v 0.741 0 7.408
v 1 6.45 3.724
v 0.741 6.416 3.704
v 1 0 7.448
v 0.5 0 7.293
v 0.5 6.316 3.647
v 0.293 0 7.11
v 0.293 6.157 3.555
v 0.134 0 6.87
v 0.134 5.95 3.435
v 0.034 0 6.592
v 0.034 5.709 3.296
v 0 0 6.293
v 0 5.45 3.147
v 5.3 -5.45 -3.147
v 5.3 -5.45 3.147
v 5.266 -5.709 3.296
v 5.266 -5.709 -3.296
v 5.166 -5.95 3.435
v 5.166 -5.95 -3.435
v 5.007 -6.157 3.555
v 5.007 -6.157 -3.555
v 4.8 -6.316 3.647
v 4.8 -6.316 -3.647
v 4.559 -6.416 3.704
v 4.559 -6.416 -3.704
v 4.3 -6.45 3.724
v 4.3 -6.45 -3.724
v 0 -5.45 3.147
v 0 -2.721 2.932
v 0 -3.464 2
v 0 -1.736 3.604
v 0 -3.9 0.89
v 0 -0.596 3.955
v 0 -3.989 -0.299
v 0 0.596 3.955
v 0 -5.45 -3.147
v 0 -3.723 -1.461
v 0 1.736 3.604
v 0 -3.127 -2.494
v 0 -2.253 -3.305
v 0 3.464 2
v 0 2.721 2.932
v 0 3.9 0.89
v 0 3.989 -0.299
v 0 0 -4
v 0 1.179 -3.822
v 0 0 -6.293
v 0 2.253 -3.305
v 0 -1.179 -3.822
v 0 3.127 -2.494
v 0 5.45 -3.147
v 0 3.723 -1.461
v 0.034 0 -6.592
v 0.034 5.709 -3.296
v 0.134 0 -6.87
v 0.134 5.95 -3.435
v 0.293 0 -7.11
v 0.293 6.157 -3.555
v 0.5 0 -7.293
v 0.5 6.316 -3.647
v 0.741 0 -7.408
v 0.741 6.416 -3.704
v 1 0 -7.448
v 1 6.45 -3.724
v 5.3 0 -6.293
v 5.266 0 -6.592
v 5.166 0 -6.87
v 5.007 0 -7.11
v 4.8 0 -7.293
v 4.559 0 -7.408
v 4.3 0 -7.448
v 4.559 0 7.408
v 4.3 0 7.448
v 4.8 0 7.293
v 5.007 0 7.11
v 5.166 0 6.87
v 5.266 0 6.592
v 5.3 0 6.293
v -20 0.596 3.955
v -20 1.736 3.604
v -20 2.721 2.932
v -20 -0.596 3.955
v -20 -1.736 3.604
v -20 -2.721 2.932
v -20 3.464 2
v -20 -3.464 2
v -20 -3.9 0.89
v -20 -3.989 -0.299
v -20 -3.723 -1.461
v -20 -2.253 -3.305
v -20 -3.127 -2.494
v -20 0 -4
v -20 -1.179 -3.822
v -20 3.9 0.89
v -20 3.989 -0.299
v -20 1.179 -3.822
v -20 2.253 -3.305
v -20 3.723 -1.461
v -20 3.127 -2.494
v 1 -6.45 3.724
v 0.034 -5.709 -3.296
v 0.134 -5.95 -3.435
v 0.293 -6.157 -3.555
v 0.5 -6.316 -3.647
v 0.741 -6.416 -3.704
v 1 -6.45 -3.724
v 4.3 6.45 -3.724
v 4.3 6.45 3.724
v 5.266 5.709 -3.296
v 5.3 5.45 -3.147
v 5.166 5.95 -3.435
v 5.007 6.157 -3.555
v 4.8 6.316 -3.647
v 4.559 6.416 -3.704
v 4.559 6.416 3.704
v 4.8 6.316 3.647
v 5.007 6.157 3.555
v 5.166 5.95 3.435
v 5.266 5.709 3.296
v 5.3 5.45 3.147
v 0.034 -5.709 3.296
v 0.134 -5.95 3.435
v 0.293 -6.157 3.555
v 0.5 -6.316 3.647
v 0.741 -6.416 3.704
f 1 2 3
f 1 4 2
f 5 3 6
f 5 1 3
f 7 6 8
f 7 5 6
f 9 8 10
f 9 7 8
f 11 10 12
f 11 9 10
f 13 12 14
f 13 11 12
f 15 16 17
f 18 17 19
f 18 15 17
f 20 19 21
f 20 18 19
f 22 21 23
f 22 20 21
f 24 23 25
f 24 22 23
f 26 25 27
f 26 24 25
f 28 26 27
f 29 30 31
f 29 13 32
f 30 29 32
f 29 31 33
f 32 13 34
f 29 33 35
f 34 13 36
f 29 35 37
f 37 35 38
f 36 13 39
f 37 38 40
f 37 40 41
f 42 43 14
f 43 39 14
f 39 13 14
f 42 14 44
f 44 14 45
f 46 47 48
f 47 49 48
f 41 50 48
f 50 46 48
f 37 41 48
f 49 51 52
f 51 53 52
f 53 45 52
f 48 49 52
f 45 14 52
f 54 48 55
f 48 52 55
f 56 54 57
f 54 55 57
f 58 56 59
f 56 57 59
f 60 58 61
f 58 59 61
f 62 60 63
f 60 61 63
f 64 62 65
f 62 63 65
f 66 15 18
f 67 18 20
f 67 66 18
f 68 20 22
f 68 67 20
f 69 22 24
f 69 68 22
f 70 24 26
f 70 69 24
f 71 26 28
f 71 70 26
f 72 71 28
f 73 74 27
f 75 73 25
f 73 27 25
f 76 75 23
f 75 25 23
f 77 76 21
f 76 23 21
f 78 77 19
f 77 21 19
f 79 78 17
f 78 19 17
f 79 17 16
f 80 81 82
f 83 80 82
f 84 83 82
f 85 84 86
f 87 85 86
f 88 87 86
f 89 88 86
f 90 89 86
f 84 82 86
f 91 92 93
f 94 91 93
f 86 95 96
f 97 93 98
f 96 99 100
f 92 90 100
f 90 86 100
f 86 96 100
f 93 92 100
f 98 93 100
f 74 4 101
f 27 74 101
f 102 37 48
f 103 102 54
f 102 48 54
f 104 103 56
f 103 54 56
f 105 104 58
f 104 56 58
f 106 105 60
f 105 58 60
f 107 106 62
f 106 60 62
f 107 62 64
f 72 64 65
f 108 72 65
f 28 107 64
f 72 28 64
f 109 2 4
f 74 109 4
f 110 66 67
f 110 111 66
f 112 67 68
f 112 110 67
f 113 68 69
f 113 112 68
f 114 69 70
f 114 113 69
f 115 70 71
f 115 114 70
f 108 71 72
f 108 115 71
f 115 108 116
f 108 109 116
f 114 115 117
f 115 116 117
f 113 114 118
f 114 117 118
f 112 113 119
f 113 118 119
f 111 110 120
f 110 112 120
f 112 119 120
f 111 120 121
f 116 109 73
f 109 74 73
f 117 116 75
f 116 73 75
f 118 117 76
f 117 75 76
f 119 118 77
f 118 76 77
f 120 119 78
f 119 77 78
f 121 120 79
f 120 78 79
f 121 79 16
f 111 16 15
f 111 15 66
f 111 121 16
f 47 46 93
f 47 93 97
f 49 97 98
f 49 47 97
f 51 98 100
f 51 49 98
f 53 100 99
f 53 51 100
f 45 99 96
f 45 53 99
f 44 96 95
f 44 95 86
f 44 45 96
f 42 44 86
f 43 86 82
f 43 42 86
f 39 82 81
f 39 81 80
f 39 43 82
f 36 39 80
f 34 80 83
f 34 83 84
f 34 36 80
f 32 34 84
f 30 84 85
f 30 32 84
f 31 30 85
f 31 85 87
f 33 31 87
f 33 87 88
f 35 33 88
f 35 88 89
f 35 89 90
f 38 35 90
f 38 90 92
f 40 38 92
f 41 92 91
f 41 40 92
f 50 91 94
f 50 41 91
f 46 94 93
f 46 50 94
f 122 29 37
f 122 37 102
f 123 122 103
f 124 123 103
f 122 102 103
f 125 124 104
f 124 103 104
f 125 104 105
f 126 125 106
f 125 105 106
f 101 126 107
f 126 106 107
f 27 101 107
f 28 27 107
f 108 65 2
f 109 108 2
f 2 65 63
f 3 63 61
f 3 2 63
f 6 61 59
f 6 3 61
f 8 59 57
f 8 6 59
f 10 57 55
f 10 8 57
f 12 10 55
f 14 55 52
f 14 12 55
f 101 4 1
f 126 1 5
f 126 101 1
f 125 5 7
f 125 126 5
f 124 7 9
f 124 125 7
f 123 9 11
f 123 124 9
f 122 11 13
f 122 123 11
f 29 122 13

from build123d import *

# Parameters (mm, degrees)
BOSS_EXTRUDE1_DEPTH = 5.3
SKETCH2_R           = 4
BOSS_EXTRUDE2_DEPTH = 20
FILLET1_R           = 1


with BuildPart() as part:
    # Sketch1 → Boss-Extrude1 (new body)
    with BuildSketch(Plane(origin=(0, 0, 0), x_dir=(0, 0, -1), z_dir=(1, 0, 0))):
        Polygon((-3.723909236, 6.45), (-7.447818473, 0), (-3.723909236, -6.45), (3.723909236, -6.45), (7.447818473, 0), (3.723909236, 6.45), align=None)
    extrude(amount=BOSS_EXTRUDE1_DEPTH)

    # Sketch2 → Boss-Extrude2 (add)
    with BuildSketch(Plane(origin=(0, 0, 0), x_dir=(0, 0, -1), z_dir=(1, 0, 0))):
        Circle(SKETCH2_R)
    extrude(amount=-BOSS_EXTRUDE2_DEPTH)

    # Fillet1
    fillet1_edges = [part.edges().sort_by_distance(p)[0] for p in [
        (5.3, -3.225, 5.585863854),
        (5.3, -6.45, 0),
        (5.3, -3.225, -5.585863854),
        (5.3, 3.225, -5.585863854),
        (5.3, 6.45, 0),
        (0, 3.225, -5.585863854),
        (0, -3.225, -5.585863854),
        (0, -6.45, 0),
        (0, -3.225, 5.585863854),
        (0, 3.225, 5.585863854),
        (0, 6.45, 0),
        (5.3, 3.225, 5.585863854),
    ]]
    fillet(fillet1_edges, radius=FILLET1_R)


solid = part.part
